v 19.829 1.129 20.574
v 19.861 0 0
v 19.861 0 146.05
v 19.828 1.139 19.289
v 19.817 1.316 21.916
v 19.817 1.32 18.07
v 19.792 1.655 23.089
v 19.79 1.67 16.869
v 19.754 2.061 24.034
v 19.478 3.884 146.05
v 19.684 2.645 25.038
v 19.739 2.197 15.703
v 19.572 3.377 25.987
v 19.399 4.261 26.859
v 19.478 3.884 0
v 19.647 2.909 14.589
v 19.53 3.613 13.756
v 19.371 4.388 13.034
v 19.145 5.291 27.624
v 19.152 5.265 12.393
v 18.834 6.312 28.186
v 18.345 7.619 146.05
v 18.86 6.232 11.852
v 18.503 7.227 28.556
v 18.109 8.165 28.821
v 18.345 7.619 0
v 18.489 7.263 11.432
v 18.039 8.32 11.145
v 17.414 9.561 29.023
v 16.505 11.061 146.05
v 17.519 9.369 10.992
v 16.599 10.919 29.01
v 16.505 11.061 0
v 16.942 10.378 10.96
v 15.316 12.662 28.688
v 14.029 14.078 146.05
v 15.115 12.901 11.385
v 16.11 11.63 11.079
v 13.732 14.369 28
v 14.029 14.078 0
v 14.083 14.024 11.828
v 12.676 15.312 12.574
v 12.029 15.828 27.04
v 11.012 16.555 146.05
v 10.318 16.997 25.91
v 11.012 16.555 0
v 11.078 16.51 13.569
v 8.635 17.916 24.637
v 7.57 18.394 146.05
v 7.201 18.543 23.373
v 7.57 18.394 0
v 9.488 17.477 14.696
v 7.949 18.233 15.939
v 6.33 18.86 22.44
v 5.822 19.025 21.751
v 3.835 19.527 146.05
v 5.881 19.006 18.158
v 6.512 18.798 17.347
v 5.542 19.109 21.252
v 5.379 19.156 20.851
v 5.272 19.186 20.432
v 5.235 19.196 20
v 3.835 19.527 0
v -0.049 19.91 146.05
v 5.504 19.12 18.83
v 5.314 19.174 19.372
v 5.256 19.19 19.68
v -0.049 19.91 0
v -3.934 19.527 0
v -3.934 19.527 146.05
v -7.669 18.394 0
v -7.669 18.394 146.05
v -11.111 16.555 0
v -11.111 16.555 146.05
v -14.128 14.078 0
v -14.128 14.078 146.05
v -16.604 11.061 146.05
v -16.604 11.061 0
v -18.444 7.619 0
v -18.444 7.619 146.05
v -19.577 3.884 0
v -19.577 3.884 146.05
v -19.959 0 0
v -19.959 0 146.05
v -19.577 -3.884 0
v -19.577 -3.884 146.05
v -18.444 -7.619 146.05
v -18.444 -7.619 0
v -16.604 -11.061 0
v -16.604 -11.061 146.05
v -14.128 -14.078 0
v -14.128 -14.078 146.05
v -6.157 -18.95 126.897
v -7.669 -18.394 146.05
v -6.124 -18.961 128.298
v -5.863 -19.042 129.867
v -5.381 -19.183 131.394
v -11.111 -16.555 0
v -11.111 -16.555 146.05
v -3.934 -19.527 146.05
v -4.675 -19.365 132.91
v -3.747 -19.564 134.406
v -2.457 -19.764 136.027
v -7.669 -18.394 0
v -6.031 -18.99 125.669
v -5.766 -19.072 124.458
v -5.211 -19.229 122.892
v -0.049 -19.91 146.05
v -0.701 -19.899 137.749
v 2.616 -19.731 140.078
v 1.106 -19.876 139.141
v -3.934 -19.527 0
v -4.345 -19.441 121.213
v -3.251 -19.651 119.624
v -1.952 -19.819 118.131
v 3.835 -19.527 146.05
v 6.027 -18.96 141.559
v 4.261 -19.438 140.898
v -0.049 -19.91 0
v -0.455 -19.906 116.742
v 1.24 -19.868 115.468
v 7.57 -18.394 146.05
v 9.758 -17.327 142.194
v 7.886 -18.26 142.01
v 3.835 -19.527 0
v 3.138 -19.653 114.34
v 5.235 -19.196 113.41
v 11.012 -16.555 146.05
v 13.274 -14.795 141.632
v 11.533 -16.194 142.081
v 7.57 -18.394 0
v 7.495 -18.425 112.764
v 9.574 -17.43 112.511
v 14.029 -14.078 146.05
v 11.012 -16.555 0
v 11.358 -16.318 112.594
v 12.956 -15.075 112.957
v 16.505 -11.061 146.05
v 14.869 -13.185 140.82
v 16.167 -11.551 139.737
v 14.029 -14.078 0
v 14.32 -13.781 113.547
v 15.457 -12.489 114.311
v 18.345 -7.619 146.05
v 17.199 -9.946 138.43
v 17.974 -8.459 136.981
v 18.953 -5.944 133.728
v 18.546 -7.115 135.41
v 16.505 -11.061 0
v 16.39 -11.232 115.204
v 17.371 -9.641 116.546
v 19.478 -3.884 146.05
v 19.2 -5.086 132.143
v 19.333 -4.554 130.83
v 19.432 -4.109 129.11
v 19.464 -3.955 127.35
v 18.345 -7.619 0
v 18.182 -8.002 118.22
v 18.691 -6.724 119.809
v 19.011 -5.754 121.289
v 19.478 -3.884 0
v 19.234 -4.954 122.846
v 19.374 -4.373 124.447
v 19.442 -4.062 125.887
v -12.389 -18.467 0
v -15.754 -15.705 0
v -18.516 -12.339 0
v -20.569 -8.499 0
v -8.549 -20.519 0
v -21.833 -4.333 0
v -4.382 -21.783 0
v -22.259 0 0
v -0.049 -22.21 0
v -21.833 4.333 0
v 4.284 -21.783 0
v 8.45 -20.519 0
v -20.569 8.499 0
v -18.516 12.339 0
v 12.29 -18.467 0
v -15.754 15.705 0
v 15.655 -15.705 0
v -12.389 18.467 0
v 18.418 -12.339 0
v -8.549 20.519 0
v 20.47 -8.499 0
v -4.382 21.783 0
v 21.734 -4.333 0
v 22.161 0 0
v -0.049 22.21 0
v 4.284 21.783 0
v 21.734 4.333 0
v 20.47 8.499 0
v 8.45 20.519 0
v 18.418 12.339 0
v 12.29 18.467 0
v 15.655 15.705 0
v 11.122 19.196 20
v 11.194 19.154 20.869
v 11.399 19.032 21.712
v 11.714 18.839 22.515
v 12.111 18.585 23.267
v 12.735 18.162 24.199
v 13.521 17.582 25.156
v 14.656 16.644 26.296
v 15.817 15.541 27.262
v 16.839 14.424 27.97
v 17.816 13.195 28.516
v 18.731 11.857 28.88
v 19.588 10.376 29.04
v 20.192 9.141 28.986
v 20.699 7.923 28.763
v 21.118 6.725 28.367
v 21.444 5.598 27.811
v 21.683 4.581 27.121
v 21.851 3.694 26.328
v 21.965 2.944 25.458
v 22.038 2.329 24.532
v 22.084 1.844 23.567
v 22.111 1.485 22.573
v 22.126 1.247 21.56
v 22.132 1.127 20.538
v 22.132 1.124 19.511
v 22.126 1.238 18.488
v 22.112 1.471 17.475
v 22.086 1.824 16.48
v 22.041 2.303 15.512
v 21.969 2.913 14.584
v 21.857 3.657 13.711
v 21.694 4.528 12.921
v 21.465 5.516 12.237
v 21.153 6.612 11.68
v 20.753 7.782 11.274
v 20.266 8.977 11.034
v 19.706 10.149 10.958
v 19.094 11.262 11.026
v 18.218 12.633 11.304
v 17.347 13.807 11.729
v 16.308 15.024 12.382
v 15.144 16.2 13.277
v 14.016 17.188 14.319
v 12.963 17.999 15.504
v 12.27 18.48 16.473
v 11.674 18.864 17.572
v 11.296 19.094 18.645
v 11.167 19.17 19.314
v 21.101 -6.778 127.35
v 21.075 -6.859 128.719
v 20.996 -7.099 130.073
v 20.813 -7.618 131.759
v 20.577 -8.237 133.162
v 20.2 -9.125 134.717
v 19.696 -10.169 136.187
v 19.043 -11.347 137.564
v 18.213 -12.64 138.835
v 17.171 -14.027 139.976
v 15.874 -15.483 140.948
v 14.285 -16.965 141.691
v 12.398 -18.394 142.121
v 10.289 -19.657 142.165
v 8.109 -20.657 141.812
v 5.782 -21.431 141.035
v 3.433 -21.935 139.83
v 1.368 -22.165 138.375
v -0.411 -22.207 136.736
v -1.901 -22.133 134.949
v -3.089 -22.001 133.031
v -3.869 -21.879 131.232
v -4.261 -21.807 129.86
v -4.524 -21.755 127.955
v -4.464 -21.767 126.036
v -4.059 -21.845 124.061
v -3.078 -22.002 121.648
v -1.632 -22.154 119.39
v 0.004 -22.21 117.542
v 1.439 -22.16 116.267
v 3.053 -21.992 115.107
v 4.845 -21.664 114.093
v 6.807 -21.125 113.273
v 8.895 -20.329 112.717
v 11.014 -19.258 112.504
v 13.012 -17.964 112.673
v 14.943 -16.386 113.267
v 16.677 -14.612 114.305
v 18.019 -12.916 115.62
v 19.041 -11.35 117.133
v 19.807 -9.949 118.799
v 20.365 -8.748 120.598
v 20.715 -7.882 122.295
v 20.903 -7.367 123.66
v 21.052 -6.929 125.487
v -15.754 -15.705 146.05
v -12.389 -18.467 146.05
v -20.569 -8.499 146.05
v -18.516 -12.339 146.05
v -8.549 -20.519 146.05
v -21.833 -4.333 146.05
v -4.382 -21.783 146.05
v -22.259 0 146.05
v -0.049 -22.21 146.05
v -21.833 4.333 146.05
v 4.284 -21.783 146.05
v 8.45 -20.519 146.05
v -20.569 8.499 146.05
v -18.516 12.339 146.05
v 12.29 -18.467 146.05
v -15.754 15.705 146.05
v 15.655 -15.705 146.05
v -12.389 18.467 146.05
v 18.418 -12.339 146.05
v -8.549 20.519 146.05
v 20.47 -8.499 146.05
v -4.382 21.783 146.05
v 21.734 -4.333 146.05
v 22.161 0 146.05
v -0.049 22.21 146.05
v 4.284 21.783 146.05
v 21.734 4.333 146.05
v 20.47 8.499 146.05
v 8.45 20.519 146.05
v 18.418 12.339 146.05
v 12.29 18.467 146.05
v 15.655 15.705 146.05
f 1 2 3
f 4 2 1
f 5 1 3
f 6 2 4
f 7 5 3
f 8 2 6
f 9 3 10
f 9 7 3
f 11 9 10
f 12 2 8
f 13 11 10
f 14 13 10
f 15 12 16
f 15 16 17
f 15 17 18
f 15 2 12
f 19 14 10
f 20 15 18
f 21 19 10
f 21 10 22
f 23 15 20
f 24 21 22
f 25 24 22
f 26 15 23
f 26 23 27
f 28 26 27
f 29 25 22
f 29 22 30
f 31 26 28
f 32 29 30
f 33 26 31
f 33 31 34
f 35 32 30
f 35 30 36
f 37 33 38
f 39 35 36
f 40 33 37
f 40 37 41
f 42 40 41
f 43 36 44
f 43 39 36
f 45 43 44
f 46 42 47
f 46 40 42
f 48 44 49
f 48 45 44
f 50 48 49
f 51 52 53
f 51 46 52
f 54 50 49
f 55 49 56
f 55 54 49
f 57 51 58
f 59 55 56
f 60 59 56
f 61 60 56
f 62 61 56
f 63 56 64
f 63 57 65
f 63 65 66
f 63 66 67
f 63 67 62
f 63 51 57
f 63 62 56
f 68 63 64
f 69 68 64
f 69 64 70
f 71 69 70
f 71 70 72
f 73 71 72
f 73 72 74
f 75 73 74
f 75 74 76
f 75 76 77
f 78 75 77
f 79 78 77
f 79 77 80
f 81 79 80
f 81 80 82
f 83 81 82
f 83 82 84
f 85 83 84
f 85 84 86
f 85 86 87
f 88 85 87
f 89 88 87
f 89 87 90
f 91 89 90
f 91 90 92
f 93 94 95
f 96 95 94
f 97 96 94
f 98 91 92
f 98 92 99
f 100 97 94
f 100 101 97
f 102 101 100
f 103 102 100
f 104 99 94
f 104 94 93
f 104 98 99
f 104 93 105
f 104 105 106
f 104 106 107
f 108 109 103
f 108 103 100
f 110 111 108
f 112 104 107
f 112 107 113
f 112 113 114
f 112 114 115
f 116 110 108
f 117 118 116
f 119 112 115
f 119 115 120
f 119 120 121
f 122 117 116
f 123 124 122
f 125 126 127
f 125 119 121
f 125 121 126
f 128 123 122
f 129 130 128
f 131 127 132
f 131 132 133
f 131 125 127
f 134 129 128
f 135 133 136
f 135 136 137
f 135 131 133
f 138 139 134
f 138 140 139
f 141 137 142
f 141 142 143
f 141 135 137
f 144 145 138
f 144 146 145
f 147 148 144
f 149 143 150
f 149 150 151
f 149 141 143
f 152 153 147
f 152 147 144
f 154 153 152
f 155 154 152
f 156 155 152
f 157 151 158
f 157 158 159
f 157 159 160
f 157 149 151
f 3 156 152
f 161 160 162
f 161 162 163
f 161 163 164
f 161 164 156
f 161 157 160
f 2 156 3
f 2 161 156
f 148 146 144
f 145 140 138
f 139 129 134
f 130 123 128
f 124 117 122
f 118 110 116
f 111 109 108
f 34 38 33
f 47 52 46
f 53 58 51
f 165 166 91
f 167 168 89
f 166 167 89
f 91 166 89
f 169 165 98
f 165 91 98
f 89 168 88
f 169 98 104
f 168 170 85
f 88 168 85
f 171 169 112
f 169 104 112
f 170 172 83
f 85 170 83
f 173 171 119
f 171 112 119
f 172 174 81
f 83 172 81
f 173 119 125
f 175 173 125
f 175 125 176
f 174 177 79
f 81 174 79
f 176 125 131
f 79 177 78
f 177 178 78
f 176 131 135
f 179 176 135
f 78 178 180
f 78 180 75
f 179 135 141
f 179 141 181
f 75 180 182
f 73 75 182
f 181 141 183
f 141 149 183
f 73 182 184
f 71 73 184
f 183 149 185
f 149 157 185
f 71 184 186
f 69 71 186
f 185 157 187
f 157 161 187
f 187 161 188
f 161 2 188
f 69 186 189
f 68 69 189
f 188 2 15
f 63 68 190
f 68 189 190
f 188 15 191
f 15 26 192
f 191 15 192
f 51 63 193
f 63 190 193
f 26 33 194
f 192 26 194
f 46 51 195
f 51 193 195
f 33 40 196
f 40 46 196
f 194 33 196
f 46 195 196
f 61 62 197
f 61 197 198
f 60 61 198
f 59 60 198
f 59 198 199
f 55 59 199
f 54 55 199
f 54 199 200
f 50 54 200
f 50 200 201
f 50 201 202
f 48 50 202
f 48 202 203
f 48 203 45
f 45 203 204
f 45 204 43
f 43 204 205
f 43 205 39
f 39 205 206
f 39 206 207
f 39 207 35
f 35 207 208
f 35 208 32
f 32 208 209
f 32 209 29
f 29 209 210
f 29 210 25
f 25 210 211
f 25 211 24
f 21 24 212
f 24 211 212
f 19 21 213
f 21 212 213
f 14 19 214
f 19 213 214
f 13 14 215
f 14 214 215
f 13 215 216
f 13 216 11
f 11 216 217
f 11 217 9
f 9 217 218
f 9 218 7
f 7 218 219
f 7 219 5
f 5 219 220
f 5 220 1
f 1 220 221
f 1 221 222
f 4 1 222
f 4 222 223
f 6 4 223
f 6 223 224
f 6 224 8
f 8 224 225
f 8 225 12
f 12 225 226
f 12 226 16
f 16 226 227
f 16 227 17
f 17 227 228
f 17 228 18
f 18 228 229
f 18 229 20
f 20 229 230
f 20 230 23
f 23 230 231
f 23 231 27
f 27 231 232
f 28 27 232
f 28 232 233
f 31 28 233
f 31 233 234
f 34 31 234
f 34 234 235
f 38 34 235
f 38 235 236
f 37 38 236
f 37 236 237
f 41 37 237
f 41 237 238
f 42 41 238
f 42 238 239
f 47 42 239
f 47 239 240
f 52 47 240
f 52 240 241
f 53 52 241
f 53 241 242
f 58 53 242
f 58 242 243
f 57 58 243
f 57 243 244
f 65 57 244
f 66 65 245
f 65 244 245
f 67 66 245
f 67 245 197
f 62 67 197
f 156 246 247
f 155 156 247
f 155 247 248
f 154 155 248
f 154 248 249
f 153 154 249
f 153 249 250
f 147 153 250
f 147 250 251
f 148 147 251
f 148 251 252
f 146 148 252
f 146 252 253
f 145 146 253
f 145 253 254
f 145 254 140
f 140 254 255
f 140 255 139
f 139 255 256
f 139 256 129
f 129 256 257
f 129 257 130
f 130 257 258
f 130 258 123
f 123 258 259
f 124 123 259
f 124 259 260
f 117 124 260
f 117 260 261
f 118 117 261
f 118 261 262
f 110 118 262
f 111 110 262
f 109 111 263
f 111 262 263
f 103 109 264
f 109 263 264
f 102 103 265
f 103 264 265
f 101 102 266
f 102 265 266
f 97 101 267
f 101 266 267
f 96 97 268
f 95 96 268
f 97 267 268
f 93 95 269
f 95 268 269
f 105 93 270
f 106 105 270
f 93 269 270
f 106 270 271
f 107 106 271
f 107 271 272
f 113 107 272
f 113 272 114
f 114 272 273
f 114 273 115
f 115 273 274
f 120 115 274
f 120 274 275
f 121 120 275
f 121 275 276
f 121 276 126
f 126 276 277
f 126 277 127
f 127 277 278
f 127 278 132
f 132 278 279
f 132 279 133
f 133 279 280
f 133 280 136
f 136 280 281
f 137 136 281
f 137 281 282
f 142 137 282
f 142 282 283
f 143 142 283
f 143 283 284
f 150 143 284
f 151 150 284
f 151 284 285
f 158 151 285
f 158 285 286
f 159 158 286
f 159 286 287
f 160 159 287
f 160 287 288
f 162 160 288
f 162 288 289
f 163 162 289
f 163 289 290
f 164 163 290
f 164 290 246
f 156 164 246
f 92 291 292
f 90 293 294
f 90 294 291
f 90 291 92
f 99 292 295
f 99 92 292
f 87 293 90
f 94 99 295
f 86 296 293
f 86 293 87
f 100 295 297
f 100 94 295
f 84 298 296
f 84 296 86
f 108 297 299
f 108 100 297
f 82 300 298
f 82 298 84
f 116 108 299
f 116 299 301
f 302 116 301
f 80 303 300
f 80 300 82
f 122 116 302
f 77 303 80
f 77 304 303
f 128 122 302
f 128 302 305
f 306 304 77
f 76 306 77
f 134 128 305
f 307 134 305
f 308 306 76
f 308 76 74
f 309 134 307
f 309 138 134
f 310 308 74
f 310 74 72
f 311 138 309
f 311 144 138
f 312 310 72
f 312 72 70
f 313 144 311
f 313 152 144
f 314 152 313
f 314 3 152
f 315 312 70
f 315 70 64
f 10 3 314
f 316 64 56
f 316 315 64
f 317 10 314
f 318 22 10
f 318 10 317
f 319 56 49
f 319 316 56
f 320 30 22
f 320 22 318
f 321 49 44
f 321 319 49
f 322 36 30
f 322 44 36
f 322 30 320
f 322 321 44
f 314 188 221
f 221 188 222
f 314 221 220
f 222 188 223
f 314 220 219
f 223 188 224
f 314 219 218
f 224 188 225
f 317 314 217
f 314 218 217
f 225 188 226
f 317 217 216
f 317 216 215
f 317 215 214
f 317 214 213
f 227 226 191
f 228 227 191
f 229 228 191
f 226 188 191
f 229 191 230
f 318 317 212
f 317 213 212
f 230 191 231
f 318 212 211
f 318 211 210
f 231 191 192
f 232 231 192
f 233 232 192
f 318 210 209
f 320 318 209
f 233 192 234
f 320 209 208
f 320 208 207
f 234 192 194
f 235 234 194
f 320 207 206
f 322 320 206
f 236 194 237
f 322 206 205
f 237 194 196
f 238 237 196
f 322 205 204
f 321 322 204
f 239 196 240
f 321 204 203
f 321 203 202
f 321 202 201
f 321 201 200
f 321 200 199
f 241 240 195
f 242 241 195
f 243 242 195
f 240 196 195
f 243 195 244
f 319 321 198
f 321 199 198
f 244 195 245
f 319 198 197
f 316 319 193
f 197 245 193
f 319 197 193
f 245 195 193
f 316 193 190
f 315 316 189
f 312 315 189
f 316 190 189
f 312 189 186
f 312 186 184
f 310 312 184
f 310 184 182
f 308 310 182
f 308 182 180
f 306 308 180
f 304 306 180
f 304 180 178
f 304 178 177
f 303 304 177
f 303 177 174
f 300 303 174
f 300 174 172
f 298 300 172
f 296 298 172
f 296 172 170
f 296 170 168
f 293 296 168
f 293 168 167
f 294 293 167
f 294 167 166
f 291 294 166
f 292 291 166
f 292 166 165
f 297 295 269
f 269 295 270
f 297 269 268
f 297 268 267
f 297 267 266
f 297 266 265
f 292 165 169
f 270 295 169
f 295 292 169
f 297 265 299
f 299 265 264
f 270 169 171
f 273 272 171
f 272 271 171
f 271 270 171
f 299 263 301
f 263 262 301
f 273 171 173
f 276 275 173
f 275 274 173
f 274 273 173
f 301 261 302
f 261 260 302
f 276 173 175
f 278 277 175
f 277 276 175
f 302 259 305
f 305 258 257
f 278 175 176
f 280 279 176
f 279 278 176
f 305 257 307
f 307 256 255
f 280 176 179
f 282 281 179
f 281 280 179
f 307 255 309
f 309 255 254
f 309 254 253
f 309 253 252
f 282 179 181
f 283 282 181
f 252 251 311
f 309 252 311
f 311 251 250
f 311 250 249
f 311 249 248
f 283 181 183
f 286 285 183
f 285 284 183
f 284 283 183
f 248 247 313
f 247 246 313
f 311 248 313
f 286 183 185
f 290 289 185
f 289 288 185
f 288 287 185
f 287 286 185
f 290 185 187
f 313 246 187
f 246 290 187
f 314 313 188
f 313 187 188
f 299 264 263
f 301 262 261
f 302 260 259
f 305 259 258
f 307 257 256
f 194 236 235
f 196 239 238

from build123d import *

# Parameters (mm, degrees)
SKETCH1_R               = 22.21
SKETCH1_R_2             = 19.91
BOSS_EXTRUDE1_DEPTH     = 146.05
CUT_EXTRUDE2_REACH      = 157.431
CUT_EXTRUDE2_END_RADIUS = 19.91
SKETCH5_R               = 14.8463
CUT_EXTRUDE3_REACH      = 156.263
SKETCH4_R               = 9.0424


with BuildPart() as part:
    # Sketch1 → Boss-Extrude1 (new body)
    with BuildSketch(Plane.XY):
        with Locations((-0.049436733, 0)):
            Circle(SKETCH1_R)
        with Locations((-0.049436733, 0)):
            Circle(SKETCH1_R_2, mode=Mode.SUBTRACT)
    extrude(amount=BOSS_EXTRUDE1_DEPTH)

    # Cut-Extrude2: up to this cylinder (the profile starts outside it)
    cut_extrude2_end = Plane(origin=(-0.049436733, 0, 127.35), z_dir=(0, 0, -1)) * Cylinder(CUT_EXTRUDE2_END_RADIUS, 355.682, mode=Mode.PRIVATE)
    # Sketch5 → Cut-Extrude2 (cut, up to the surface)
    with BuildSketch(Plane(origin=(11.092620184, -19.212981748, 146.05), x_dir=(-0.8650599616540103, -0.5016684789212517, 0), z_dir=(0.5016684789212515, -0.8650599616540102, 0)), mode=Mode.PRIVATE) as cut_extrude2_sk1:
        with Locations(Location((-0.049436639, 18.7, 0), (0, 0, 180))):
            Circle(SKETCH5_R)
    cut_extrude2_tool1 = extrude(cut_extrude2_sk1.sketch, amount=-CUT_EXTRUDE2_REACH, mode=Mode.PRIVATE) - cut_extrude2_end
    add(cut_extrude2_tool1.solids().sort_by_distance((11.135386, -19.188181, 127.35))[0], mode=Mode.SUBTRACT)

    # Sketch4 → Cut-Extrude3 (cut, up to next)
    with BuildSketch(Plane(origin=(22.160563267, 0, 146.05), x_dir=(0, 0, -1), z_dir=(1, 0, 0)), mode=Mode.PRIVATE) as cut_extrude3_sk1:
        with Locations(Location((126.05, 10.153466667, 0), (0, 0, 90))):
            Circle(SKETCH4_R)
    cut_extrude3_tool1 = extrude(cut_extrude3_sk1.sketch, amount=-CUT_EXTRUDE3_REACH, mode=Mode.PRIVATE) & part.part
    add(cut_extrude3_tool1.solids().sort_by_distance((22.160563, 10.153467, 20))[0], mode=Mode.SUBTRACT)


solid = part.part
